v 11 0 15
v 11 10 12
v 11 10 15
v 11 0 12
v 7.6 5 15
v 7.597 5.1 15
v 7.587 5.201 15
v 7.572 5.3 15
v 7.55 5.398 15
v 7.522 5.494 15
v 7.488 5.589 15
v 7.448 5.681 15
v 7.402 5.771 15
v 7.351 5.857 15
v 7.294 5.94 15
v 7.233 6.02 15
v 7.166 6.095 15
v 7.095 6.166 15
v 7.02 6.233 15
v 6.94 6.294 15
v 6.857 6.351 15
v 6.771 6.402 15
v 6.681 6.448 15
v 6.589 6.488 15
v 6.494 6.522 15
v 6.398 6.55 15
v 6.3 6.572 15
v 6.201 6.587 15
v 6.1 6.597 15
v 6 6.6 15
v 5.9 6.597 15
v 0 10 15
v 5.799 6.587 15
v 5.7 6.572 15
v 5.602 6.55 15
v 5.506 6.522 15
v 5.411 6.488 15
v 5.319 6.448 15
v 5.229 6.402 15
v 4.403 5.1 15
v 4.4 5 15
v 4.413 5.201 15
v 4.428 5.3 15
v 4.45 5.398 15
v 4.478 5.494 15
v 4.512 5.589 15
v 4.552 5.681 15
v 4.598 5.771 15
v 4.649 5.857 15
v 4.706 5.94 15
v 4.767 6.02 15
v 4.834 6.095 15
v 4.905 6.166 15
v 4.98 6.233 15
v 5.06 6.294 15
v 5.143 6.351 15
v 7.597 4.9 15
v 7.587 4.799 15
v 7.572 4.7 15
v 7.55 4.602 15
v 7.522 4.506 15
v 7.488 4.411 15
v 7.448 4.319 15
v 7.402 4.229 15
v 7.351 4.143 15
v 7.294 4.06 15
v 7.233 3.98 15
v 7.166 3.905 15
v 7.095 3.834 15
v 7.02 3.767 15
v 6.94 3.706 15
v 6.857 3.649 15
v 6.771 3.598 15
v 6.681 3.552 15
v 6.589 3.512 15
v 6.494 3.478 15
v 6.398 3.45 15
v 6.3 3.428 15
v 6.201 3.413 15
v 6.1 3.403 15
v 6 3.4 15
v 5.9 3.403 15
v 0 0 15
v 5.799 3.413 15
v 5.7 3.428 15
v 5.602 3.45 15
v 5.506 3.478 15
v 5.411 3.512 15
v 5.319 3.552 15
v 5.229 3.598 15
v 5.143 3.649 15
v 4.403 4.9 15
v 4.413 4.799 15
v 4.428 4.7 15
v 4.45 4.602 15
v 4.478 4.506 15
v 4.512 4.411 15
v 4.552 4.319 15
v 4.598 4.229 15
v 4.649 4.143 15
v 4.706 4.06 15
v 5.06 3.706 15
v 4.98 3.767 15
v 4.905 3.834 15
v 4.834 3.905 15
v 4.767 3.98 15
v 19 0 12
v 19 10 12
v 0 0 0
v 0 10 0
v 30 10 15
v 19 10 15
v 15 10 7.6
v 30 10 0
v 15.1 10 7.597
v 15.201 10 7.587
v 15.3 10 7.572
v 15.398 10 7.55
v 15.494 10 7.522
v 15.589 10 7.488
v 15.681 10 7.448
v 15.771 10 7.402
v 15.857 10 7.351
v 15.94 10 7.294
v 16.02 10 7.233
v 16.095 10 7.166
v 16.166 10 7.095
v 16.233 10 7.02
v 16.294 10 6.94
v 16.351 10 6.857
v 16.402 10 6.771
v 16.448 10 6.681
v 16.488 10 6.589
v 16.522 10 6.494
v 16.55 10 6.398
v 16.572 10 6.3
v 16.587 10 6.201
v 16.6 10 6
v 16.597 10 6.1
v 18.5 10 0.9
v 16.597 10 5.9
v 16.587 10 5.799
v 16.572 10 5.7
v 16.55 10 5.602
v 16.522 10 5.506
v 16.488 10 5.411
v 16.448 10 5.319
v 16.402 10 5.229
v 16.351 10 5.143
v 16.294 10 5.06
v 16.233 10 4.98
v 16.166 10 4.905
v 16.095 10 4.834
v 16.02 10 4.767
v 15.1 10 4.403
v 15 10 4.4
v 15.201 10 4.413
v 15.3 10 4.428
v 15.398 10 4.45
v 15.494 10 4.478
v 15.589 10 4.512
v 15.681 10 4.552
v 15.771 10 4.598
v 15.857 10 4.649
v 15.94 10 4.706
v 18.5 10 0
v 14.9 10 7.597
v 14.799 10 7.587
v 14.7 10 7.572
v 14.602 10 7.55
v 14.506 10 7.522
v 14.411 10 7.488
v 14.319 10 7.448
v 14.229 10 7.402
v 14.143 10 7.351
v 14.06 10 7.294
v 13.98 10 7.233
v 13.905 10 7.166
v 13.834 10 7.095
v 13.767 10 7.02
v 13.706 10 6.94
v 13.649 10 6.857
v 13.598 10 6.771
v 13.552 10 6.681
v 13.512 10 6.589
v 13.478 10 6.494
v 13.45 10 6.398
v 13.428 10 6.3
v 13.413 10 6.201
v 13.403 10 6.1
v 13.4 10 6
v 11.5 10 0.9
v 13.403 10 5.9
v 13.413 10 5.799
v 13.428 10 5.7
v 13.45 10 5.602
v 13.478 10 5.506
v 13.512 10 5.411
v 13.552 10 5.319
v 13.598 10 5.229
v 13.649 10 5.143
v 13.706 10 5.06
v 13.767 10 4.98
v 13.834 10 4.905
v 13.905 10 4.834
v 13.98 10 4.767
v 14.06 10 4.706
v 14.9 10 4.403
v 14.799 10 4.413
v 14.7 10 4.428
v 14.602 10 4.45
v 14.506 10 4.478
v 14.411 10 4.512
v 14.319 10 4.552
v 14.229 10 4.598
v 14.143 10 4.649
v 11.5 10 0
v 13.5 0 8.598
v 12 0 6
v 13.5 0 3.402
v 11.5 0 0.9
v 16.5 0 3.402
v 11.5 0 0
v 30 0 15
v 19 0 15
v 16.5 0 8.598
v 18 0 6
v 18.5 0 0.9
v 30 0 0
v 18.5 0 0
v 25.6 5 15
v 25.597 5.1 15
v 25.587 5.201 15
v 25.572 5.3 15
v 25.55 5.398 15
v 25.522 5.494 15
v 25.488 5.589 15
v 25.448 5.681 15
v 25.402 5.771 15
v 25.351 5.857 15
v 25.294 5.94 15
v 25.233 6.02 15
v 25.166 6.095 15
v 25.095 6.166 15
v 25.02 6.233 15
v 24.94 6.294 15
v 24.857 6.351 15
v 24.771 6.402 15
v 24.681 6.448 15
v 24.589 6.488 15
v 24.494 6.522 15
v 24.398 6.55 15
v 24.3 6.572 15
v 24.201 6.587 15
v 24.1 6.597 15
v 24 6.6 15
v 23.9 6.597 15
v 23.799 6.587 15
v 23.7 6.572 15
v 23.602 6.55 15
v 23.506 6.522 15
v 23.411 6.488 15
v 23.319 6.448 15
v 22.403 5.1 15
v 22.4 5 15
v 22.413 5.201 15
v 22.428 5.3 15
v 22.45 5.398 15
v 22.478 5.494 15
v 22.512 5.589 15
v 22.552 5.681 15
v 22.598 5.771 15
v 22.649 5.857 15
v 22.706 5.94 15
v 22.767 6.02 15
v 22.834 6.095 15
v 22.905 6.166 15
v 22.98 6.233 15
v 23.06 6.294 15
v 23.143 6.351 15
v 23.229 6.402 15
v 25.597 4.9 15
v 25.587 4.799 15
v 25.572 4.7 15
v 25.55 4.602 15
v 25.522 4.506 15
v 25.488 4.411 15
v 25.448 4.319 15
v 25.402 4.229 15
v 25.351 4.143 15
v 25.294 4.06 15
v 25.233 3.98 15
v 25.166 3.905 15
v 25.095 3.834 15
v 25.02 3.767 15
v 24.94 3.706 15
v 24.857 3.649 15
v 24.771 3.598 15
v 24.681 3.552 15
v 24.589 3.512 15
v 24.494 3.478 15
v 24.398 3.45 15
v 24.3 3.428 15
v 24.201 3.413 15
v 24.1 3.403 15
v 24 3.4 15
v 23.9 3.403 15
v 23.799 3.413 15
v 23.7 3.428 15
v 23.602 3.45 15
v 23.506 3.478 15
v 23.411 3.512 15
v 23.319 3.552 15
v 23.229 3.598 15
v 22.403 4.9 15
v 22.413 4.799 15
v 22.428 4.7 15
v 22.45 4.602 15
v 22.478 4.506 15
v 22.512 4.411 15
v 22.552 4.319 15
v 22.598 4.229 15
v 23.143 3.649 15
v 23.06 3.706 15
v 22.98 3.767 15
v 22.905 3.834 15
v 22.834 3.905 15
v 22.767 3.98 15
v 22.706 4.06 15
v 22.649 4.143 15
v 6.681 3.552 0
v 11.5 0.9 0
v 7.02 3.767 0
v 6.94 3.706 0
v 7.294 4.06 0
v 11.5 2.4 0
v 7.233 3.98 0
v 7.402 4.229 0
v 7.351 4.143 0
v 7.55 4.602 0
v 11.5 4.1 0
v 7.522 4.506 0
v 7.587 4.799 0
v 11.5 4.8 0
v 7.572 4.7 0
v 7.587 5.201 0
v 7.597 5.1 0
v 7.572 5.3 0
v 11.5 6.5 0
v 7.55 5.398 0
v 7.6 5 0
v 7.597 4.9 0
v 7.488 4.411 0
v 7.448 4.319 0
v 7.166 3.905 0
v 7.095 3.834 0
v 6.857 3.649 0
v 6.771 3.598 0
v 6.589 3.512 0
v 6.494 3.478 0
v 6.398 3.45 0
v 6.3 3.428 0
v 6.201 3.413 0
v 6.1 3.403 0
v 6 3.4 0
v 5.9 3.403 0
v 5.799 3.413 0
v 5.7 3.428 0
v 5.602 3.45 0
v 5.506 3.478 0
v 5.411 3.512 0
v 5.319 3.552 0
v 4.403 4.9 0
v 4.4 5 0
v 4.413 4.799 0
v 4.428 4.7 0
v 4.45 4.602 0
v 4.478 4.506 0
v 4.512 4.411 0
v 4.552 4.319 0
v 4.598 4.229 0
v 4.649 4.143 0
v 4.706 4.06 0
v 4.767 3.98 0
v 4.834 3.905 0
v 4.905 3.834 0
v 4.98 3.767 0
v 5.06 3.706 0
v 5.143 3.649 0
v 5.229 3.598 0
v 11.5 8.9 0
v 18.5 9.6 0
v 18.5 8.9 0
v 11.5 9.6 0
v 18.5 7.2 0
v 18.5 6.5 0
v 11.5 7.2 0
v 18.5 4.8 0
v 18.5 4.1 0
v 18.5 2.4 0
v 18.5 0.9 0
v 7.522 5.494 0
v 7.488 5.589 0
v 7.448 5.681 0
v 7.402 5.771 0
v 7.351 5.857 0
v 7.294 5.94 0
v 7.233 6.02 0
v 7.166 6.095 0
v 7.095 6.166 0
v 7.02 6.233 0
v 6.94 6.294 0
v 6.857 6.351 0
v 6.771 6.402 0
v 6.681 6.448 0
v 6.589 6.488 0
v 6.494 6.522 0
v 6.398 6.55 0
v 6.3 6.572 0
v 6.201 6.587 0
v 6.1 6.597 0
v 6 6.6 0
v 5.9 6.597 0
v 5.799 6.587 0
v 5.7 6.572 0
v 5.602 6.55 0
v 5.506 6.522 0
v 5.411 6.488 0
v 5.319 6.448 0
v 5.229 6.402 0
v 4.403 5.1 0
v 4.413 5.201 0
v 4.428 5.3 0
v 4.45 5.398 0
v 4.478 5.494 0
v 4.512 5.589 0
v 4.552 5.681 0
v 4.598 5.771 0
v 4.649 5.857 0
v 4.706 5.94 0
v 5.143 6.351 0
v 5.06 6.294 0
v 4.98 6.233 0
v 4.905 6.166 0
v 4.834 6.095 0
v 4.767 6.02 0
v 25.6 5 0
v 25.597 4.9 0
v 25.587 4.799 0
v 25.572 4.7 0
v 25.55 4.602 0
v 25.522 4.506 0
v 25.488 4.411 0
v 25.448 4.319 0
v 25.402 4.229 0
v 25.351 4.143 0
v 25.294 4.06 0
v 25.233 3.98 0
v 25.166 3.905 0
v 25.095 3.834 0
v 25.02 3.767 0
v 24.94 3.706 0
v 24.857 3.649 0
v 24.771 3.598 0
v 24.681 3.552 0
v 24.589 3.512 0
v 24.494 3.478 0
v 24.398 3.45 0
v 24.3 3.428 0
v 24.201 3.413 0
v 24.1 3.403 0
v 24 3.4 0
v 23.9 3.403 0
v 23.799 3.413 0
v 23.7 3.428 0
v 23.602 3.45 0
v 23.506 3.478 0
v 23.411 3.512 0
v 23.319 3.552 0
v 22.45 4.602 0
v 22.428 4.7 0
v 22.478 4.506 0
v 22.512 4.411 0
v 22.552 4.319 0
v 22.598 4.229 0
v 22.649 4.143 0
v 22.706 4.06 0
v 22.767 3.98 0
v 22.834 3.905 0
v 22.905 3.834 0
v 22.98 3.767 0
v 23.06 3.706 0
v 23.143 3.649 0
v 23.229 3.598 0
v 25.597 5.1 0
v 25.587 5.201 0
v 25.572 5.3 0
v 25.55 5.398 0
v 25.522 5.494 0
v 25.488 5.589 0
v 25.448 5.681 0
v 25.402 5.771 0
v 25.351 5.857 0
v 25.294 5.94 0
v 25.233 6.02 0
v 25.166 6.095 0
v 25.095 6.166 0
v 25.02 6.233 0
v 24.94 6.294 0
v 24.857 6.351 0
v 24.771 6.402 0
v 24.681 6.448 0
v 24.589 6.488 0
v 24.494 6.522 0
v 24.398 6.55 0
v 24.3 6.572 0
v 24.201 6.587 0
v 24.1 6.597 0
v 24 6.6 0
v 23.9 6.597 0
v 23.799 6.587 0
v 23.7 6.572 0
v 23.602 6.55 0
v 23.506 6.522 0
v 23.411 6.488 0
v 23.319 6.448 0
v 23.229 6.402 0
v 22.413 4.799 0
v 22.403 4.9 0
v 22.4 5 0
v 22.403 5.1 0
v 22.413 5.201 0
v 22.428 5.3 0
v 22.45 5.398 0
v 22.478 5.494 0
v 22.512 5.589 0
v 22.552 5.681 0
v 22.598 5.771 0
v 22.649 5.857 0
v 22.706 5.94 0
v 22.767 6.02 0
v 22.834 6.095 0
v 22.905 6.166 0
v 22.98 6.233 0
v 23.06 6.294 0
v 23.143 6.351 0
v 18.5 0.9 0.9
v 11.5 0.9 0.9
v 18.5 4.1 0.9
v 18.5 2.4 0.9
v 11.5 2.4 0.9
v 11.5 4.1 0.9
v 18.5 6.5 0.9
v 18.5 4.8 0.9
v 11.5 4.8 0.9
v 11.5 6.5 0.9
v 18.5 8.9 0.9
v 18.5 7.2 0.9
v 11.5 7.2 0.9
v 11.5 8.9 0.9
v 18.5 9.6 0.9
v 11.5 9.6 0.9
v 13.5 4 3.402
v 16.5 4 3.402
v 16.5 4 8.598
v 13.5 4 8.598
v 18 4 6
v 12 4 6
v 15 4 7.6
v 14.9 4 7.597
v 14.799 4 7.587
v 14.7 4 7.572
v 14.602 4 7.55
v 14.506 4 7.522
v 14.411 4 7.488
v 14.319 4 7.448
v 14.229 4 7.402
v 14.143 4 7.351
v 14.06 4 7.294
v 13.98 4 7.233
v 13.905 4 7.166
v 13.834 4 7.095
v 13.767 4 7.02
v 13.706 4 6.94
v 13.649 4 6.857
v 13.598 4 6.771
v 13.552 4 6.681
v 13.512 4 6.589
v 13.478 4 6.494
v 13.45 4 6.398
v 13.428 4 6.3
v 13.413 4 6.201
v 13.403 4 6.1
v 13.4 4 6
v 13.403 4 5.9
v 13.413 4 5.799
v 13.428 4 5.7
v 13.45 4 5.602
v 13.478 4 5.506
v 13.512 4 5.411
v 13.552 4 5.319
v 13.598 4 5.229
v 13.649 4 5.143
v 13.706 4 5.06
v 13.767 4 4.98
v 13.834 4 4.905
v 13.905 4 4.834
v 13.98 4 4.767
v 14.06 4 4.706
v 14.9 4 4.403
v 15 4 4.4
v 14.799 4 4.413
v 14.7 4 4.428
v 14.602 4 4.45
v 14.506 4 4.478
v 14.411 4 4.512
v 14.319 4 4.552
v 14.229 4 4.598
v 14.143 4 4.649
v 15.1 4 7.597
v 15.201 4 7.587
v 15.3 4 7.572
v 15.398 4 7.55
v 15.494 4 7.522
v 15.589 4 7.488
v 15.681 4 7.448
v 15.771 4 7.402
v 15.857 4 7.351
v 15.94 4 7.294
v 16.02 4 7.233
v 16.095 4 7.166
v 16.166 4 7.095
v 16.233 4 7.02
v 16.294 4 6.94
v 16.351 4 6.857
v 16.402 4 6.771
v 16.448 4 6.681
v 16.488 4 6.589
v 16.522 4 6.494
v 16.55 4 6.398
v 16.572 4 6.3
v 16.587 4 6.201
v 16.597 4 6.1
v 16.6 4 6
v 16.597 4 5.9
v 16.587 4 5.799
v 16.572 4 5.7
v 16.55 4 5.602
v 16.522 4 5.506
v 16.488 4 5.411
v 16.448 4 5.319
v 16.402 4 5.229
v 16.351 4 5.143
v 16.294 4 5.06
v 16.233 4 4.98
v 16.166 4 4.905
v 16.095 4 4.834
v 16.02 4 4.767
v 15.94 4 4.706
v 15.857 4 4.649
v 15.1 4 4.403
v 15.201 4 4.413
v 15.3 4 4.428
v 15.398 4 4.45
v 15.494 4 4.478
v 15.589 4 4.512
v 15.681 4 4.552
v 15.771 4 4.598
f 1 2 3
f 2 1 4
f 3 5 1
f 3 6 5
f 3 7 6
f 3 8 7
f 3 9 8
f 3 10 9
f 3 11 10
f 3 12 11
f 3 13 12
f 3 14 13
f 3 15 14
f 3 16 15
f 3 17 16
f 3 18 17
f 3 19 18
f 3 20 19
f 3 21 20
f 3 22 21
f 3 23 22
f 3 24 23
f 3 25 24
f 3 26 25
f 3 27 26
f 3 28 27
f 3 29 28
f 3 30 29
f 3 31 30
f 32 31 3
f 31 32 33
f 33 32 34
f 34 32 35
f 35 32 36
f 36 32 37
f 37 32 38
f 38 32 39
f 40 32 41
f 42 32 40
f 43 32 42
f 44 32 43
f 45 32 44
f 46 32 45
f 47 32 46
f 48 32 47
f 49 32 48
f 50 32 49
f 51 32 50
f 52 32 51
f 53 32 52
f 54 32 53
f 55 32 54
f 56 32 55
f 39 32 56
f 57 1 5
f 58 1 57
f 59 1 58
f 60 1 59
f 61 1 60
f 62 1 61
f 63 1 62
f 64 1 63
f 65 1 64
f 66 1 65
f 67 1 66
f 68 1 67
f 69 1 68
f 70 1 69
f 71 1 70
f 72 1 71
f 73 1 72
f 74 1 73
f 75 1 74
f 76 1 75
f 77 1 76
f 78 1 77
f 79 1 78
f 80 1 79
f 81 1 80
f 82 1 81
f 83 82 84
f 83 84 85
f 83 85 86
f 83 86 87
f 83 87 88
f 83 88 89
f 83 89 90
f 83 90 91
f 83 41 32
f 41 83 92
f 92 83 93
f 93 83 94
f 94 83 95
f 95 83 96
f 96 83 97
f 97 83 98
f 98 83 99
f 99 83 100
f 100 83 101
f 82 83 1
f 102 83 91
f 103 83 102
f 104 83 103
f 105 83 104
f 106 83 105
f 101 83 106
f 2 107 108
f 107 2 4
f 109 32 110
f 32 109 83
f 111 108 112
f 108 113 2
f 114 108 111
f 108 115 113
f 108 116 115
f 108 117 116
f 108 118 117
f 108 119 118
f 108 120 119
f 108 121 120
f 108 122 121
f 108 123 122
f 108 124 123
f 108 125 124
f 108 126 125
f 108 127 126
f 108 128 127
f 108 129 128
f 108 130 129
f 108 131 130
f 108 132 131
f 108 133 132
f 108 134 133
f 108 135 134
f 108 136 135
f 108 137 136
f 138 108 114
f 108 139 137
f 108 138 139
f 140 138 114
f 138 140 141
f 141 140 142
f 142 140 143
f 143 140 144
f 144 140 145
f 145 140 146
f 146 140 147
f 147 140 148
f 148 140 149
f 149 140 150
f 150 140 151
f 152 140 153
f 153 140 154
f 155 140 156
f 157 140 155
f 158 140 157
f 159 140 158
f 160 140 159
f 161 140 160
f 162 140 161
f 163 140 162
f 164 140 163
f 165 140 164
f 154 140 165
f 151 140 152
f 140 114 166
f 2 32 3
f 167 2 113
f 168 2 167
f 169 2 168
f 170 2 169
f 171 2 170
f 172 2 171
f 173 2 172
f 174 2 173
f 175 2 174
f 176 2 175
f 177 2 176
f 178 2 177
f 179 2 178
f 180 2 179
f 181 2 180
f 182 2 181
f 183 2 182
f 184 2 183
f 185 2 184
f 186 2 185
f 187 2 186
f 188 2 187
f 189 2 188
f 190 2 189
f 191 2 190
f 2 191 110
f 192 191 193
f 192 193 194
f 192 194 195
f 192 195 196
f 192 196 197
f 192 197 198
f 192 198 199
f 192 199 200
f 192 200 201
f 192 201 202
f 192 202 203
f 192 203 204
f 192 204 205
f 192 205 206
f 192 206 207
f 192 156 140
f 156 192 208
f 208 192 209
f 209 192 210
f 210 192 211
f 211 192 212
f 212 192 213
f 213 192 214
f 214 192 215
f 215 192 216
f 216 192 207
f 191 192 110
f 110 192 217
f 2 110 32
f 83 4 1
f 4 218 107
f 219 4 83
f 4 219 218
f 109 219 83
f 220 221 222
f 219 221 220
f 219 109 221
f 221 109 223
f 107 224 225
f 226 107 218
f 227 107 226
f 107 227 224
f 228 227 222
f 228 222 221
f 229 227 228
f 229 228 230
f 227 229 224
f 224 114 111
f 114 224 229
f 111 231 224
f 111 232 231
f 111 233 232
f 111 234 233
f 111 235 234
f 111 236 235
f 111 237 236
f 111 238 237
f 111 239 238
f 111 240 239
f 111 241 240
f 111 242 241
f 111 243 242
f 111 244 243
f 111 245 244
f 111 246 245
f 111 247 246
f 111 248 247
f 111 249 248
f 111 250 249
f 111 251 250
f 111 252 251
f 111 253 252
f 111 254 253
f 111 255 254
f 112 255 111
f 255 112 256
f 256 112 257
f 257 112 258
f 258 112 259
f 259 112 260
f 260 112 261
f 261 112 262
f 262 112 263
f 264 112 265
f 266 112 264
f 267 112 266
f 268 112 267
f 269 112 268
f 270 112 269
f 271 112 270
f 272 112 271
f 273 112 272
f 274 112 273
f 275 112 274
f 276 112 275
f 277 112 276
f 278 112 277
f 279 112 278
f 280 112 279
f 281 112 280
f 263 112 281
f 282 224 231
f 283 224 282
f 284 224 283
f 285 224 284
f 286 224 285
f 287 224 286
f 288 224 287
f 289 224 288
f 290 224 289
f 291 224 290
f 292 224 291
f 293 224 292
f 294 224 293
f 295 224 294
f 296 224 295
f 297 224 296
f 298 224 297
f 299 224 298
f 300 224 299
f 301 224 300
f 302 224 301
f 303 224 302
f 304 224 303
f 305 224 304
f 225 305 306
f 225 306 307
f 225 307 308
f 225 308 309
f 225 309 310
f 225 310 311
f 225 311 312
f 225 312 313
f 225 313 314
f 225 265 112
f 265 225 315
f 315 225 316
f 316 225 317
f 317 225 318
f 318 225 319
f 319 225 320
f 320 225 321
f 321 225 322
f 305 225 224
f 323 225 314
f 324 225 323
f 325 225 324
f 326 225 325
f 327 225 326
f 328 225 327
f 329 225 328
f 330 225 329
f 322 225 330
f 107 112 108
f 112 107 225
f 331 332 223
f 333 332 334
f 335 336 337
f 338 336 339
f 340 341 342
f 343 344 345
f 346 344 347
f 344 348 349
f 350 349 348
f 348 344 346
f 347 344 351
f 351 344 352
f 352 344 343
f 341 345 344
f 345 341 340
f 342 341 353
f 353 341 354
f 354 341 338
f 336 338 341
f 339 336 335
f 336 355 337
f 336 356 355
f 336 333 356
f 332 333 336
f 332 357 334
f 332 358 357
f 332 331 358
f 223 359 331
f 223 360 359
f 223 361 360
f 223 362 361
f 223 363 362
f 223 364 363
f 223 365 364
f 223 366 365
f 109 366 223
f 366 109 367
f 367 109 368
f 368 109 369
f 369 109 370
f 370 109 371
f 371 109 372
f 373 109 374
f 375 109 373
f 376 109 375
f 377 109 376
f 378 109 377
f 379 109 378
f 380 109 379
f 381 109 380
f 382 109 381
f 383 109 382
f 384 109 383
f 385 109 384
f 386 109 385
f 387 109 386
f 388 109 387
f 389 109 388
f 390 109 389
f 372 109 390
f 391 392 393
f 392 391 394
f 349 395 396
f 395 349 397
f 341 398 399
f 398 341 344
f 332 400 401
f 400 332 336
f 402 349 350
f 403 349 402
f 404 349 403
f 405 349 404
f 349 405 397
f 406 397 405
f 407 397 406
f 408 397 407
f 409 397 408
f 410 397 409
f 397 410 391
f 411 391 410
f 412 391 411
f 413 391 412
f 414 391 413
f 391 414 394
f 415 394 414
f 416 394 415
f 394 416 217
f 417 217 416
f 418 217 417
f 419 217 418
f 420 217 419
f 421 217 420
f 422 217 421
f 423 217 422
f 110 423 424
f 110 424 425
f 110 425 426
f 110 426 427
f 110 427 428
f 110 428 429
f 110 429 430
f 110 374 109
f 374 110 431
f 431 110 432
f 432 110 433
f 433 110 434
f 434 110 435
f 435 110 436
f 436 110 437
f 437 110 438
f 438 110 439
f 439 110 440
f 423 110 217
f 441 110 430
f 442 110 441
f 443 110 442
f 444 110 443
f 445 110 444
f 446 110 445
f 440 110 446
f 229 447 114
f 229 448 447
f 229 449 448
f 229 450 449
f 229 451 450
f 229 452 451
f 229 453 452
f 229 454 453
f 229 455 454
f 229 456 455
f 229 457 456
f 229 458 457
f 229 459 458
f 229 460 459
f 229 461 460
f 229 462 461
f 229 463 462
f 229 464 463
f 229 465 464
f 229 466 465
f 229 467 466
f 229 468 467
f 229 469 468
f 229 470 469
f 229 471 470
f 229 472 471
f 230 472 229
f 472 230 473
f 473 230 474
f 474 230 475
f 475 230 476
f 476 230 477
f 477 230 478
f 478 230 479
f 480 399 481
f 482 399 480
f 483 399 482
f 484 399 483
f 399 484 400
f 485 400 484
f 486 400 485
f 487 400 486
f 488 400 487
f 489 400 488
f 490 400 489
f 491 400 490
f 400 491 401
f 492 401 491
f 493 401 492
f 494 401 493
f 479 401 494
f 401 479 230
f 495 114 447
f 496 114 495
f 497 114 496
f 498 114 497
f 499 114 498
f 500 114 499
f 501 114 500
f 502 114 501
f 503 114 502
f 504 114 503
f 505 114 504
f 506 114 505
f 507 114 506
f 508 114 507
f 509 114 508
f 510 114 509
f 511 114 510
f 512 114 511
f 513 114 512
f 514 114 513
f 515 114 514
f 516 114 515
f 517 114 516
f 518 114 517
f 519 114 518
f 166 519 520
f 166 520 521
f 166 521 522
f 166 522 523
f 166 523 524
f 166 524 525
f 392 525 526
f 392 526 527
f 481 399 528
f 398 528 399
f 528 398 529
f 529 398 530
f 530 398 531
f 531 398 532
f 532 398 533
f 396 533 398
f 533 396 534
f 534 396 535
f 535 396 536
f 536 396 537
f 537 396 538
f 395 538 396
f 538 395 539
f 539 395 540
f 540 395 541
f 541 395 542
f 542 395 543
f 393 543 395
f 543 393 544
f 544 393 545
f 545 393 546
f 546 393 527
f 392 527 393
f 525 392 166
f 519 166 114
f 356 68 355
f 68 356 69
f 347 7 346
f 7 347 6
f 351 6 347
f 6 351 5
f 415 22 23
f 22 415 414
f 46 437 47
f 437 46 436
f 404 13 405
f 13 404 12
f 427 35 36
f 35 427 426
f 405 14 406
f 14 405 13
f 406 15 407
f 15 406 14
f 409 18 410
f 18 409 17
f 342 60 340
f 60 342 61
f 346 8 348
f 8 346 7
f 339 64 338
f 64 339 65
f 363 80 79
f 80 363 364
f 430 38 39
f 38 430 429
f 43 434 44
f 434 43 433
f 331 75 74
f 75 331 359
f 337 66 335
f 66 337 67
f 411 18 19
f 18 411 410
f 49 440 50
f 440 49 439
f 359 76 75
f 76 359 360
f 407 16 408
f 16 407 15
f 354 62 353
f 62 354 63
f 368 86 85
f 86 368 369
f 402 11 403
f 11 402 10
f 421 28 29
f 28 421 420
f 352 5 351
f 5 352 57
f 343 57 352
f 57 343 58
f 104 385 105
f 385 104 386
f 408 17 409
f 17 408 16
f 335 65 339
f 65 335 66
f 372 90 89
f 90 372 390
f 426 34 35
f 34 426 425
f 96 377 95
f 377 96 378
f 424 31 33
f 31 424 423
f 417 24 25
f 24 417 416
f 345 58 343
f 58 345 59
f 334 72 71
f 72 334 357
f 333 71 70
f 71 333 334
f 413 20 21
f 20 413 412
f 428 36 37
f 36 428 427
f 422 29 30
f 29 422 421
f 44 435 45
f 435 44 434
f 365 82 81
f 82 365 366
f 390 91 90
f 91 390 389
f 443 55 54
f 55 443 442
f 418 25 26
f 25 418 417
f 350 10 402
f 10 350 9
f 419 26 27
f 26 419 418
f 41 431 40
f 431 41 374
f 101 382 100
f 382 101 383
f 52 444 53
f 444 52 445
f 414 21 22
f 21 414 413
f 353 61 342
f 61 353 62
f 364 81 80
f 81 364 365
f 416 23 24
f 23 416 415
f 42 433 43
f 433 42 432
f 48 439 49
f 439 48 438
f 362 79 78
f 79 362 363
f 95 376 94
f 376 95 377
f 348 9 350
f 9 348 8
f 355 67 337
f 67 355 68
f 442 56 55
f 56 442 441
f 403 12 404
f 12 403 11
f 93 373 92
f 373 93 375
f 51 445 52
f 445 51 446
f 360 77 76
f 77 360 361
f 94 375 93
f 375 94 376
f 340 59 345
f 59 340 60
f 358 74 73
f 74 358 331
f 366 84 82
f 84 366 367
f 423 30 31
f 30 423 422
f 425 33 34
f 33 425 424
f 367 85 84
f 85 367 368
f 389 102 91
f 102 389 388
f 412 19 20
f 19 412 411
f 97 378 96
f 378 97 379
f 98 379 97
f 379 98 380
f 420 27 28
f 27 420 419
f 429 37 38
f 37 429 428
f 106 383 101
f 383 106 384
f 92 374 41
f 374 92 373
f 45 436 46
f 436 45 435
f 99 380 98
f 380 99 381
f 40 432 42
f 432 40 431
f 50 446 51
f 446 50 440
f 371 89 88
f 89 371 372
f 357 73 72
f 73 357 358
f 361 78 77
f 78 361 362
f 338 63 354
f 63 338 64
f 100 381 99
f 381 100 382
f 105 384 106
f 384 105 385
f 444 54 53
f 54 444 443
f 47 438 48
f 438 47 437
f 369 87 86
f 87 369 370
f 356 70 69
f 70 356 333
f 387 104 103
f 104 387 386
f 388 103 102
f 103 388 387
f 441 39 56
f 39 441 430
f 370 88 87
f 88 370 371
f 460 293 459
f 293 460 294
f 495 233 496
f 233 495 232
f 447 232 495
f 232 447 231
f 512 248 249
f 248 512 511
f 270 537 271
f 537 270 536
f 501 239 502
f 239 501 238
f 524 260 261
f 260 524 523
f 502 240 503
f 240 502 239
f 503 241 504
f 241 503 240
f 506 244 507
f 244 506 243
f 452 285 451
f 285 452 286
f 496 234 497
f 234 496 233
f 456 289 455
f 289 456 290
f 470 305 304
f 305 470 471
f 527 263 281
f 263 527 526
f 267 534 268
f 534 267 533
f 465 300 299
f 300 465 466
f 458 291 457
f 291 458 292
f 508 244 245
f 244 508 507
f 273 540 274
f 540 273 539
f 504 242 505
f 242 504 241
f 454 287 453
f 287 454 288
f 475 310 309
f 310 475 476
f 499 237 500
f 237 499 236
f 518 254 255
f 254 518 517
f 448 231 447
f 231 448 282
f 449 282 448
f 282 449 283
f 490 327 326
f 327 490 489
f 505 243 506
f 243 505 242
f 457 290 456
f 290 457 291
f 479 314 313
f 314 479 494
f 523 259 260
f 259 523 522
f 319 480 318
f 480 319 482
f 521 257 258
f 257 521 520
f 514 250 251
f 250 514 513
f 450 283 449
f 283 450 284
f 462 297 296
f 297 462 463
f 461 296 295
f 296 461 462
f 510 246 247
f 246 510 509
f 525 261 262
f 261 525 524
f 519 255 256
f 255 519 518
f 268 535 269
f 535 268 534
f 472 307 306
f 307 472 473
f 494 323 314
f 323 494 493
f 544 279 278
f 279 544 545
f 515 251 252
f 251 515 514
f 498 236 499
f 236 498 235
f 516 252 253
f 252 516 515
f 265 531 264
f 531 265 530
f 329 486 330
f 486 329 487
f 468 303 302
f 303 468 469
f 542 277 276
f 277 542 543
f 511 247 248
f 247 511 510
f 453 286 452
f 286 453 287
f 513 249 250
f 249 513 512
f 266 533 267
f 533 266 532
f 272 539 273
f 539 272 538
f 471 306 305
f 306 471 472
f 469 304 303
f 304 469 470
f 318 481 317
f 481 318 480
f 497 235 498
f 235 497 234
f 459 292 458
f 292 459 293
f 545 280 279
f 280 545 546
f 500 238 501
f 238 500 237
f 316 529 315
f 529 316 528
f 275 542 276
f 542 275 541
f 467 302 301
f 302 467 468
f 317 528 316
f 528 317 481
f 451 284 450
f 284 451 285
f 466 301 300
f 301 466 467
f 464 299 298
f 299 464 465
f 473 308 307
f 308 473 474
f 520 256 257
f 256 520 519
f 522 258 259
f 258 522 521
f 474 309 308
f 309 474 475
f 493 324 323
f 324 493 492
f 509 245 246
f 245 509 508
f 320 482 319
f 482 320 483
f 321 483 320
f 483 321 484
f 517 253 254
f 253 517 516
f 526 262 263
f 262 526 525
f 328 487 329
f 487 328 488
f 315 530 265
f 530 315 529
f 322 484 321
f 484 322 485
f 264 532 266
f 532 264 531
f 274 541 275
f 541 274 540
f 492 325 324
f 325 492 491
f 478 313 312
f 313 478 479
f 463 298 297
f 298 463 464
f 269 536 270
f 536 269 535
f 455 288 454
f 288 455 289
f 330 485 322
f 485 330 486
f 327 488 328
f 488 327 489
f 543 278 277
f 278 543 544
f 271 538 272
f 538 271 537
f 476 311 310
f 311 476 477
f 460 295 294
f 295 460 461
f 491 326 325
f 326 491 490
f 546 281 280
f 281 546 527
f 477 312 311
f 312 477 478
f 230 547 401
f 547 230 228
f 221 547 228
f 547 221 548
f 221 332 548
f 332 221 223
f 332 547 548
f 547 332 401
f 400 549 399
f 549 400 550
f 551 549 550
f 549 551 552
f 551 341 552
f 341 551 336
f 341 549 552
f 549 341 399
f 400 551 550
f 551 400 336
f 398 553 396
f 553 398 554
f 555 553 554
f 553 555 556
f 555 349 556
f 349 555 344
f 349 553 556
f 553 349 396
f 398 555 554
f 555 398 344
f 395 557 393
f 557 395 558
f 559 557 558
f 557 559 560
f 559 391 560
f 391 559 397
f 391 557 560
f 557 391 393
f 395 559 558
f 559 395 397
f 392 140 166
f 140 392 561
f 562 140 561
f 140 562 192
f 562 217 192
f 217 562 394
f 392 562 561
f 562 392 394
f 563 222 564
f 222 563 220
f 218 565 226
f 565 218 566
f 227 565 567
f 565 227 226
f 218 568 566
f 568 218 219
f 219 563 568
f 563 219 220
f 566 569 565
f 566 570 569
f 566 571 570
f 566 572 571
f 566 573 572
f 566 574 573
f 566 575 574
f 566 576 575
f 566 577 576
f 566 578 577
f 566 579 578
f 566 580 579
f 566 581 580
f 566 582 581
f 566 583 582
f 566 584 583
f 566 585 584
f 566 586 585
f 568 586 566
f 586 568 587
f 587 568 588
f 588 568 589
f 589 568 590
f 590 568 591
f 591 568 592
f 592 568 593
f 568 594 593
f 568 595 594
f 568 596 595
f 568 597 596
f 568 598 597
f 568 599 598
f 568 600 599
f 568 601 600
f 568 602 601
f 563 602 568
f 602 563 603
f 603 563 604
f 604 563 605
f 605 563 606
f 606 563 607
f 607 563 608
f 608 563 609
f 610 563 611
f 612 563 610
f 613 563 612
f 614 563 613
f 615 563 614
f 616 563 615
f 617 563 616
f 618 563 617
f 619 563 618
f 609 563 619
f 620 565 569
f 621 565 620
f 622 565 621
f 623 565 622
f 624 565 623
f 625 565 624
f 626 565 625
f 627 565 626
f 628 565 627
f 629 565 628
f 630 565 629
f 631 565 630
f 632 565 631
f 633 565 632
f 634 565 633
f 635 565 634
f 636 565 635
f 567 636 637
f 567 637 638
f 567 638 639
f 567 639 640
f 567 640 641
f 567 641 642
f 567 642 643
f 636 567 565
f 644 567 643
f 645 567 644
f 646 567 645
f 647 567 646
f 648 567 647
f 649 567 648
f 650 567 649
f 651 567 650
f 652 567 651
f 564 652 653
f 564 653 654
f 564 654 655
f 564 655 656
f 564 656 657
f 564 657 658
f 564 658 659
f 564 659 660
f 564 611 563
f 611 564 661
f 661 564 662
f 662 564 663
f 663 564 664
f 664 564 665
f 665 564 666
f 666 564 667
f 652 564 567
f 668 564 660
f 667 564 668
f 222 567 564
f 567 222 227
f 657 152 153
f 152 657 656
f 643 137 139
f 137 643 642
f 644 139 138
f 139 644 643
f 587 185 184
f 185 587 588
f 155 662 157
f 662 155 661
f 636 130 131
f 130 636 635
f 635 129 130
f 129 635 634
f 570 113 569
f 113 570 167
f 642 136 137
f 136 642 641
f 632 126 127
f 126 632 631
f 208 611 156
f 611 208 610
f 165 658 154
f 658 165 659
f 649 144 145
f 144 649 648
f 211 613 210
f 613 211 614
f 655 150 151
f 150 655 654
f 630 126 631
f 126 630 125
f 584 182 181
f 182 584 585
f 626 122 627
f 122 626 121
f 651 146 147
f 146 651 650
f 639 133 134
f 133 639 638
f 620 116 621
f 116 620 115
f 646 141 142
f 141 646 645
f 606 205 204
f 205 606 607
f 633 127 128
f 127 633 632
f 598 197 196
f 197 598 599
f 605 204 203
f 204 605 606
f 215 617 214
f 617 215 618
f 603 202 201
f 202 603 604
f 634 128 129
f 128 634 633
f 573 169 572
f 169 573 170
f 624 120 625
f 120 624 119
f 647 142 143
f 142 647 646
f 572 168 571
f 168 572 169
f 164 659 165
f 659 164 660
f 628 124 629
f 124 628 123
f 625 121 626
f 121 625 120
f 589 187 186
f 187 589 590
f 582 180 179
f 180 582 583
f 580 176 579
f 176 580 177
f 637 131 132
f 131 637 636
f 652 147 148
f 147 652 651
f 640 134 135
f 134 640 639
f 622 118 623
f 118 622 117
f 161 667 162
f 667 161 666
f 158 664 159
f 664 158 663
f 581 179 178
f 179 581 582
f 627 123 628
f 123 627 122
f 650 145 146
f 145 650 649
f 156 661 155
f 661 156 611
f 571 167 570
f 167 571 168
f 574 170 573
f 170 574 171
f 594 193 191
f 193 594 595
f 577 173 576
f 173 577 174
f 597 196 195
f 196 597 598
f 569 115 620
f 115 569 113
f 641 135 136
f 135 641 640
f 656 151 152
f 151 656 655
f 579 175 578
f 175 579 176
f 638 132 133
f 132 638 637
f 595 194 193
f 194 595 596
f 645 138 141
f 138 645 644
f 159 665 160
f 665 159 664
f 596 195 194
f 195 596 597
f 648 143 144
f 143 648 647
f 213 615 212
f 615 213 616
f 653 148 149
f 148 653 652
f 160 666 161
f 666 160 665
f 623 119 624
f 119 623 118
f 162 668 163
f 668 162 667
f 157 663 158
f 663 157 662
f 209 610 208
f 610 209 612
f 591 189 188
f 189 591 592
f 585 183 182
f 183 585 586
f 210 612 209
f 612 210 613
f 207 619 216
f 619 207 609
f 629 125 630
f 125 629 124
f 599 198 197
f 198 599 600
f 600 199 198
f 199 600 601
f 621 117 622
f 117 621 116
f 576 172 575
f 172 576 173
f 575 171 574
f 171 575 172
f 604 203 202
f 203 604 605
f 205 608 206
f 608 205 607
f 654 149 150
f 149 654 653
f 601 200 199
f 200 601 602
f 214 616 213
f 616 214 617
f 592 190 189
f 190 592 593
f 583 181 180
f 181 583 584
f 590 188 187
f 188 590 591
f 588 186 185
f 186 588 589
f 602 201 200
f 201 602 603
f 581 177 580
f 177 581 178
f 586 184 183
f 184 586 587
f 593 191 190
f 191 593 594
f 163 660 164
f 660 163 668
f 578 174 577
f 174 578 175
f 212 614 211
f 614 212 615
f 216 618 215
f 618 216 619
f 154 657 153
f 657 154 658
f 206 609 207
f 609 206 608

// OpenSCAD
difference()
{
	union()
	{
		cube([30, 10, 12]);
		for( x = [0, 19])
		{ 
			translate([x, 0, 12])
				cube([11, 10, 3]);
		}
	}

	translate([15, 4, 6]){
		rotate(a=[90, 0, 0]){
			cylinder(r=6/2, h=6, $fn=6);

		}
	}

	translate([15, 15, 6]){
		rotate(a=[90, 0, 0]){
			cylinder(r=3.2/2, h=20, $fn=100);
		}
	}


	for (x = [6, 24])
	{
		translate( [x, 5, 0])
			cylinder(r= 3.2/2, h=60, $fn=100);	
	}

	for ( y = [-0.8, 2.4, 2.4*2, 2.4*3, 2.4*4 ])
	{
		translate([11.5, y, 0])
			cube([7, 1.7, 0.9]);
	}


}
